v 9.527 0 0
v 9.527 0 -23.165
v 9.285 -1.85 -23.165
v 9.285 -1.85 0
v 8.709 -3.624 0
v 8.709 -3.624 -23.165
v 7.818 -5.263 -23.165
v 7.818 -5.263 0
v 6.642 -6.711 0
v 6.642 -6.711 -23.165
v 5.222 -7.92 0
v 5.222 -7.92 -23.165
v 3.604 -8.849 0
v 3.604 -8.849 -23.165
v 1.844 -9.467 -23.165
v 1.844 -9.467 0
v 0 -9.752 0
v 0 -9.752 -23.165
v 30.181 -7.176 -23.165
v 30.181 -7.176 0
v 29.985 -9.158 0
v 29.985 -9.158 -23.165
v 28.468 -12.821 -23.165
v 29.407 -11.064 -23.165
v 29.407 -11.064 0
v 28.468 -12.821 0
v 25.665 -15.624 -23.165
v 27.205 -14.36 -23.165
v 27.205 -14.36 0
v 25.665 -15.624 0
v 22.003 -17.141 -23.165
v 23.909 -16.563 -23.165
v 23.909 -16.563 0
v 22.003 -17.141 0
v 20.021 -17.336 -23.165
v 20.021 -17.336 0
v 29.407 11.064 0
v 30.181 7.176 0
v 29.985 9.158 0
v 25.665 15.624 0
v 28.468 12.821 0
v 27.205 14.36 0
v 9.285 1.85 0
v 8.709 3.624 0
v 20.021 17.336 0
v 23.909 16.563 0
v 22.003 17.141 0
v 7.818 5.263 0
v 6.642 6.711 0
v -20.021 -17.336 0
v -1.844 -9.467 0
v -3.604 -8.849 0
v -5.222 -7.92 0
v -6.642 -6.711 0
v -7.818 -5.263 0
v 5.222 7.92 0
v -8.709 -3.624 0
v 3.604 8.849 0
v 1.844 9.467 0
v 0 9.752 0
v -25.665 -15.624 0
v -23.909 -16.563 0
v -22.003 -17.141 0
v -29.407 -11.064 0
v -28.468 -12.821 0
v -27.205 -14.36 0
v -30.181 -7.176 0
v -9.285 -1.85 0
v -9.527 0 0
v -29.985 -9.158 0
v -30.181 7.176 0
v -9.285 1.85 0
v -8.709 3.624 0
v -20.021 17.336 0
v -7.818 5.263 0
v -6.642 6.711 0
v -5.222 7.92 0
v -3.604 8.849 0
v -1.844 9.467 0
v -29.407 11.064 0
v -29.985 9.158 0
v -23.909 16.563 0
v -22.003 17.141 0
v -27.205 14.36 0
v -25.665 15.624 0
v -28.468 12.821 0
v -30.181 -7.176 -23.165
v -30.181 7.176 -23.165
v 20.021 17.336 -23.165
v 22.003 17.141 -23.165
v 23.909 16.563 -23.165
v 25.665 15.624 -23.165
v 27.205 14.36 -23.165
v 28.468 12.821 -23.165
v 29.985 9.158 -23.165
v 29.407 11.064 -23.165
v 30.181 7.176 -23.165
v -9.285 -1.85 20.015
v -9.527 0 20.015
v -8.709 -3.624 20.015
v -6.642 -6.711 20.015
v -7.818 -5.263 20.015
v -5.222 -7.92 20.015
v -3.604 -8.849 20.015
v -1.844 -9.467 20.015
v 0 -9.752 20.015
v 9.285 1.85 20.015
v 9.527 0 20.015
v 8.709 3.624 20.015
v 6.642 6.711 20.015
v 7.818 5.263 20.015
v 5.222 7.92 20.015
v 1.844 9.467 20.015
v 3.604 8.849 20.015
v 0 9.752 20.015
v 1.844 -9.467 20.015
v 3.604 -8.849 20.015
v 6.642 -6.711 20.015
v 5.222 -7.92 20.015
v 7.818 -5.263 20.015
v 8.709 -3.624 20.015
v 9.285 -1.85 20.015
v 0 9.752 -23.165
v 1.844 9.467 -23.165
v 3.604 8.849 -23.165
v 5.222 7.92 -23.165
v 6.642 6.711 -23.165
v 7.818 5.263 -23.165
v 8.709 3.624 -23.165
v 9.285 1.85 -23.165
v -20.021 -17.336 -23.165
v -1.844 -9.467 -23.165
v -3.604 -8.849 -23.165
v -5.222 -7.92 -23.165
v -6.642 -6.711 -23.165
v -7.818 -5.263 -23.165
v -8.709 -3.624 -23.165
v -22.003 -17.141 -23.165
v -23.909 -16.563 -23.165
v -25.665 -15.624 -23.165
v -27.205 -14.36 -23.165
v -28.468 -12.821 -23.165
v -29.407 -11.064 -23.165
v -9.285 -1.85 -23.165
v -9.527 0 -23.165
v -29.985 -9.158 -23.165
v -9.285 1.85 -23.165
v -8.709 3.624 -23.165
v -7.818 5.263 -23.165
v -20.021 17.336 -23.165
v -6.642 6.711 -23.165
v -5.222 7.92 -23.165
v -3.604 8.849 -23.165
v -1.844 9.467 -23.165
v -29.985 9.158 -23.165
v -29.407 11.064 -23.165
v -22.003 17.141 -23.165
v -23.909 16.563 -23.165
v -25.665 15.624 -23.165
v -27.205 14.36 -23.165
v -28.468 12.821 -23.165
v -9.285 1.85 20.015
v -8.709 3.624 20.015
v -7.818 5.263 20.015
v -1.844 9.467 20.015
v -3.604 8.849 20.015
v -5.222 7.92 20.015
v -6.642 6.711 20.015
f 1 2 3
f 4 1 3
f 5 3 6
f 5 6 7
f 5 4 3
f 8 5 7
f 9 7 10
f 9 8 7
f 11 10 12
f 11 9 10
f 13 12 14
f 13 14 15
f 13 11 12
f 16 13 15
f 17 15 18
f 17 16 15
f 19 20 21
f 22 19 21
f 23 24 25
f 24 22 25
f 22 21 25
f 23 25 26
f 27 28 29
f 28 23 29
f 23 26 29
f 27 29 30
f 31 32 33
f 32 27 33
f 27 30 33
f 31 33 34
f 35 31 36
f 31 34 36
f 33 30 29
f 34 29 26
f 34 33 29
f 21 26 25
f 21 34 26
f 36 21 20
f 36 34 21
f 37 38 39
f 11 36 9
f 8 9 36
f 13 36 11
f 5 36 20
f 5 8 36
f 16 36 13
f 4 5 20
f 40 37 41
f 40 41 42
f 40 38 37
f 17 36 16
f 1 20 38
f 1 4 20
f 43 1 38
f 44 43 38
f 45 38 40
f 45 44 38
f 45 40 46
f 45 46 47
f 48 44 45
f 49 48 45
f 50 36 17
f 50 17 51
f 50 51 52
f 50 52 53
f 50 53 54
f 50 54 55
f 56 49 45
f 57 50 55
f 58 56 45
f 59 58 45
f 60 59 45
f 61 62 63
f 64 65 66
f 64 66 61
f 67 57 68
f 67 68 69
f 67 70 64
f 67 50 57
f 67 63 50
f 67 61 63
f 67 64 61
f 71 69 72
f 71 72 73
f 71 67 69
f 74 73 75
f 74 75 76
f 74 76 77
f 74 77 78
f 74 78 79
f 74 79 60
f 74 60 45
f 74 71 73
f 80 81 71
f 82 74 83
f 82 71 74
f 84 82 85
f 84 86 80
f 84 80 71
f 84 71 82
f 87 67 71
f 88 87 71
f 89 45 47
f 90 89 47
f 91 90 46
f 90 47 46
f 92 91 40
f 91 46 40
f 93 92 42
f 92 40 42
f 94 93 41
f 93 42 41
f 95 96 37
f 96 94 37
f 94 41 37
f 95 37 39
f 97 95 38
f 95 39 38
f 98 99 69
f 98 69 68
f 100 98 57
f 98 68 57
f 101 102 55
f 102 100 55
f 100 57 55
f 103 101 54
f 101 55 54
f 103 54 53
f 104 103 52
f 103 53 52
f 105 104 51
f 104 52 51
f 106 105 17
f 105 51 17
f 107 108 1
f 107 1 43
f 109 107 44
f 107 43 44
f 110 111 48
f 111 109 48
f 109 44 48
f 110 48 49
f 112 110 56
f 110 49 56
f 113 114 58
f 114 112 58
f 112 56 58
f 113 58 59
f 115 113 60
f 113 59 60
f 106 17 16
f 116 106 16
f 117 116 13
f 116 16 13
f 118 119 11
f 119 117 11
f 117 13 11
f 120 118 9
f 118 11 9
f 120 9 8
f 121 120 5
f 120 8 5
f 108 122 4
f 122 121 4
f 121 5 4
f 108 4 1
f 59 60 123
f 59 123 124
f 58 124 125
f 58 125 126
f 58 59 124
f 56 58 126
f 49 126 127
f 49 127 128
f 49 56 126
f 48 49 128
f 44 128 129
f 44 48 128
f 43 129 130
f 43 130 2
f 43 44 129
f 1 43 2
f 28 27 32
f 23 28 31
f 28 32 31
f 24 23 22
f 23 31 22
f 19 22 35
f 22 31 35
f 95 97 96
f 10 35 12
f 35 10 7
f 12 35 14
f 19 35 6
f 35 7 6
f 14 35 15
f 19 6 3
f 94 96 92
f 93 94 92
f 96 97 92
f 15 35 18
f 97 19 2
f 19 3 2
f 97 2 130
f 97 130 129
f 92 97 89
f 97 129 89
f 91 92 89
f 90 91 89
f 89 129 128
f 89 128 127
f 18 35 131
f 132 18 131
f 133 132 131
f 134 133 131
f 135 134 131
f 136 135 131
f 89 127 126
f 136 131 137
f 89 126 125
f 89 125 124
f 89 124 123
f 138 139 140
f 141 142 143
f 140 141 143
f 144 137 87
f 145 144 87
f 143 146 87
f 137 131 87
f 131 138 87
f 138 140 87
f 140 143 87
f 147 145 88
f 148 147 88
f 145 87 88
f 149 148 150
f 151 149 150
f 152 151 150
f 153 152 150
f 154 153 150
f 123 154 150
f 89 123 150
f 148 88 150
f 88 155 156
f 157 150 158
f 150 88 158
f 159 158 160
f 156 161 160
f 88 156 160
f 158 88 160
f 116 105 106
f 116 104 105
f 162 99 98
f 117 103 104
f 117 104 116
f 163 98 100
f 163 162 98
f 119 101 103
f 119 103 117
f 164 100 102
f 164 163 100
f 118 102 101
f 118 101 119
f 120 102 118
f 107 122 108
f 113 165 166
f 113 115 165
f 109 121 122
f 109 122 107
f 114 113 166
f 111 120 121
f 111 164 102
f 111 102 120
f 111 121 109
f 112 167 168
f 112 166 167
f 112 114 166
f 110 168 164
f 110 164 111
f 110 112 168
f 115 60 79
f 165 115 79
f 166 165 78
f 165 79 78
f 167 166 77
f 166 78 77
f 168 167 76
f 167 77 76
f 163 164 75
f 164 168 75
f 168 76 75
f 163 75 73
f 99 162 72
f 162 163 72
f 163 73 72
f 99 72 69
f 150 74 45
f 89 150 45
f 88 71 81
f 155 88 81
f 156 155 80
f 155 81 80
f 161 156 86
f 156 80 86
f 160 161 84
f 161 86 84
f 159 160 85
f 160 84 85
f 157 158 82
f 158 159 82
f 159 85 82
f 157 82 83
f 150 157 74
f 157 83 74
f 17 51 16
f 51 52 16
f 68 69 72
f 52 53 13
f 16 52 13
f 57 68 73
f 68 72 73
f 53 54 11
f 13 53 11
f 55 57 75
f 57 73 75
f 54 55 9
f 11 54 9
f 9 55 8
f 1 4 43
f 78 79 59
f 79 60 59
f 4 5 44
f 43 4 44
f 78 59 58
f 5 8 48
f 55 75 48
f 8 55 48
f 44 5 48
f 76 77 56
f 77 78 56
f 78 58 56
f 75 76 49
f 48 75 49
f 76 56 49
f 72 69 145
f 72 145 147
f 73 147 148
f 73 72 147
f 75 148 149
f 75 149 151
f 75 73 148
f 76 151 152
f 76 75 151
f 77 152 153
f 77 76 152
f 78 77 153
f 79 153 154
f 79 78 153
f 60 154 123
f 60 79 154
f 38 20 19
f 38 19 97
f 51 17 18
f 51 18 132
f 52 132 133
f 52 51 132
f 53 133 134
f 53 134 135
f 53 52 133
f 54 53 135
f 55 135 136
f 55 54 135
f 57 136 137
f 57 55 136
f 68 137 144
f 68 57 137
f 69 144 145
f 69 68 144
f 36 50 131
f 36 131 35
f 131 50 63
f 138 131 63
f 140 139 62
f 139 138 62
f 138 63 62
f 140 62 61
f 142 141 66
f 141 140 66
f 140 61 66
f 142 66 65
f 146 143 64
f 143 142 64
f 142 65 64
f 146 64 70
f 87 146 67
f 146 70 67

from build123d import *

# Parameters (mm, degrees)
SKETCH1_W           = 47.674288096
SKETCH1_H           = 48.856295238
BOSS_EXTRUDE1_DEPTH = 50.038
SKETCH1_4_W         = 150.902911904
SKETCH1_4_H         = 86.68052381
SKETCH1_4_W_2       = 47.674288096
SKETCH1_4_H_2       = 48.856295238
BOSS_EXTRUDE2_DEPTH = 57.912
FILLET1_R           = 25.4
FILLET2_R           = 25.4
SCALE2_SCALE        = 0.4


with BuildPart() as part:
    # Sketch1 → Boss-Extrude1 (new body)
    with BuildSketch(Plane.XY):
        Rectangle(SKETCH1_W, SKETCH1_H)
    extrude(amount=BOSS_EXTRUDE1_DEPTH)

    # Fillet2
    # the kernel refuses this fillet: 25.4 mm, written as the material it takes off along each edge
    with BuildSketch(Plane(origin=(23.837144048, 24.428147619, -63.5), x_dir=(-1, 0, 0), z_dir=(0, 0, 1)), Plane(origin=(23.837144048, -24.428147619, -63.5), x_dir=(0, 1, 0), z_dir=(0, 0, 1)), Plane(origin=(-23.837144048, -24.428147619, -63.5), x_dir=(1, 0, 0), z_dir=(0, 0, 1))) as fillet2_piece_1:
        with BuildLine():
            CenterArc((FILLET2_R, FILLET2_R), FILLET2_R, 180, 90)
            Line((0, FILLET2_R), (0, 0))
            Line((0, 0), (FILLET2_R, 0))
        make_face()
    extrude(amount=177.038, mode=Mode.SUBTRACT)
    with BuildSketch(Plane(origin=(-23.837144048, 24.428147619, -63.5), x_dir=(1, 0, 0), z_dir=(0, 0, 1))) as fillet2_piece_2:
        with BuildLine():
            CenterArc((FILLET2_R, -FILLET2_R), FILLET2_R, 90, 90)
            Line((0, -FILLET2_R), (0, 0))
            Line((0, 0), (FILLET2_R, 0))
        make_face()
    extrude(amount=177.038, mode=Mode.SUBTRACT)


with BuildPart() as body_2:
    # Sketch1<4> → Boss-Extrude2 (new body)
    with BuildSketch(Plane.XY):
        Rectangle(SKETCH1_4_W, SKETCH1_4_H)
        Rectangle(SKETCH1_4_W_2, SKETCH1_4_H_2, mode=Mode.SUBTRACT)
    extrude(amount=-BOSS_EXTRUDE2_DEPTH)

    # Fillet1
    # the kernel refuses this fillet: 25.4 mm, written as the material it adds along each edge
    with BuildSketch(Plane(origin=(-23.837144048, 24.428147619, 0), x_dir=(0, -1, 0), z_dir=(0, 0, -1))) as fillet1_piece_1:
        with BuildLine():
            CenterArc((FILLET1_R, -FILLET1_R), FILLET1_R, 90, 90)
            Line((0, -FILLET1_R), (0, 0))
            Line((0, 0), (FILLET1_R, 0))
        make_face()
    extrude(amount=57.912)
    with BuildSketch(Plane(origin=(23.837144048, 24.428147619, 0), x_dir=(0, -1, 0), z_dir=(0, 0, -1)), Plane(origin=(23.837144048, -24.428147619, 0), x_dir=(-1, 0, 0), z_dir=(0, 0, -1)), Plane(origin=(-23.837144048, -24.428147619, 0), x_dir=(0, 1, 0), z_dir=(0, 0, -1))) as fillet1_piece_2:
        with BuildLine():
            CenterArc((FILLET1_R, FILLET1_R), FILLET1_R, 180, 90)
            Line((0, FILLET1_R), (0, 0))
            Line((0, 0), (FILLET1_R, 0))
        make_face()
    extrude(amount=57.912)
    # the kernel refuses this fillet: 25.4 mm, written as the material it takes off along each edge
    with BuildSketch(Plane(origin=(-75.451455952, 43.340261905, 63.5), x_dir=(1, 0, 0), z_dir=(0, 0, -1)), Plane(origin=(75.451455952, 43.340261905, 63.5), x_dir=(0, -1, 0), z_dir=(0, 0, -1))) as fillet1_2_piece_1:
        with BuildLine():
            CenterArc((FILLET1_R, FILLET1_R), FILLET1_R, 180, 90)
            Line((0, FILLET1_R), (0, 0))
            Line((0, 0), (FILLET1_R, 0))
        make_face()
    extrude(amount=184.912, mode=Mode.SUBTRACT)
    with BuildSketch(Plane(origin=(-75.451455952, -43.340261905, 63.5), x_dir=(1, 0, 0), z_dir=(0, 0, -1)), Plane(origin=(75.451455952, -43.340261905, 63.5), x_dir=(0, 1, 0), z_dir=(0, 0, -1))) as fillet1_2_piece_2:
        with BuildLine():
            CenterArc((FILLET1_R, -FILLET1_R), FILLET1_R, 90, 90)
            Line((0, -FILLET1_R), (0, 0))
            Line((0, 0), (FILLET1_R, 0))
        make_face()
    extrude(amount=184.912, mode=Mode.SUBTRACT)


with BuildPart() as body_2_1:
    # Scale2: scaled about (0, 0, 0)
    add(body_2.part.scale(SCALE2_SCALE))


with BuildPart() as part_1:
    # Scale2: scaled about (0, 0, 0)
    add(part.part.scale(SCALE2_SCALE))


solid = Compound([body_2_1.part, part_1.part])
